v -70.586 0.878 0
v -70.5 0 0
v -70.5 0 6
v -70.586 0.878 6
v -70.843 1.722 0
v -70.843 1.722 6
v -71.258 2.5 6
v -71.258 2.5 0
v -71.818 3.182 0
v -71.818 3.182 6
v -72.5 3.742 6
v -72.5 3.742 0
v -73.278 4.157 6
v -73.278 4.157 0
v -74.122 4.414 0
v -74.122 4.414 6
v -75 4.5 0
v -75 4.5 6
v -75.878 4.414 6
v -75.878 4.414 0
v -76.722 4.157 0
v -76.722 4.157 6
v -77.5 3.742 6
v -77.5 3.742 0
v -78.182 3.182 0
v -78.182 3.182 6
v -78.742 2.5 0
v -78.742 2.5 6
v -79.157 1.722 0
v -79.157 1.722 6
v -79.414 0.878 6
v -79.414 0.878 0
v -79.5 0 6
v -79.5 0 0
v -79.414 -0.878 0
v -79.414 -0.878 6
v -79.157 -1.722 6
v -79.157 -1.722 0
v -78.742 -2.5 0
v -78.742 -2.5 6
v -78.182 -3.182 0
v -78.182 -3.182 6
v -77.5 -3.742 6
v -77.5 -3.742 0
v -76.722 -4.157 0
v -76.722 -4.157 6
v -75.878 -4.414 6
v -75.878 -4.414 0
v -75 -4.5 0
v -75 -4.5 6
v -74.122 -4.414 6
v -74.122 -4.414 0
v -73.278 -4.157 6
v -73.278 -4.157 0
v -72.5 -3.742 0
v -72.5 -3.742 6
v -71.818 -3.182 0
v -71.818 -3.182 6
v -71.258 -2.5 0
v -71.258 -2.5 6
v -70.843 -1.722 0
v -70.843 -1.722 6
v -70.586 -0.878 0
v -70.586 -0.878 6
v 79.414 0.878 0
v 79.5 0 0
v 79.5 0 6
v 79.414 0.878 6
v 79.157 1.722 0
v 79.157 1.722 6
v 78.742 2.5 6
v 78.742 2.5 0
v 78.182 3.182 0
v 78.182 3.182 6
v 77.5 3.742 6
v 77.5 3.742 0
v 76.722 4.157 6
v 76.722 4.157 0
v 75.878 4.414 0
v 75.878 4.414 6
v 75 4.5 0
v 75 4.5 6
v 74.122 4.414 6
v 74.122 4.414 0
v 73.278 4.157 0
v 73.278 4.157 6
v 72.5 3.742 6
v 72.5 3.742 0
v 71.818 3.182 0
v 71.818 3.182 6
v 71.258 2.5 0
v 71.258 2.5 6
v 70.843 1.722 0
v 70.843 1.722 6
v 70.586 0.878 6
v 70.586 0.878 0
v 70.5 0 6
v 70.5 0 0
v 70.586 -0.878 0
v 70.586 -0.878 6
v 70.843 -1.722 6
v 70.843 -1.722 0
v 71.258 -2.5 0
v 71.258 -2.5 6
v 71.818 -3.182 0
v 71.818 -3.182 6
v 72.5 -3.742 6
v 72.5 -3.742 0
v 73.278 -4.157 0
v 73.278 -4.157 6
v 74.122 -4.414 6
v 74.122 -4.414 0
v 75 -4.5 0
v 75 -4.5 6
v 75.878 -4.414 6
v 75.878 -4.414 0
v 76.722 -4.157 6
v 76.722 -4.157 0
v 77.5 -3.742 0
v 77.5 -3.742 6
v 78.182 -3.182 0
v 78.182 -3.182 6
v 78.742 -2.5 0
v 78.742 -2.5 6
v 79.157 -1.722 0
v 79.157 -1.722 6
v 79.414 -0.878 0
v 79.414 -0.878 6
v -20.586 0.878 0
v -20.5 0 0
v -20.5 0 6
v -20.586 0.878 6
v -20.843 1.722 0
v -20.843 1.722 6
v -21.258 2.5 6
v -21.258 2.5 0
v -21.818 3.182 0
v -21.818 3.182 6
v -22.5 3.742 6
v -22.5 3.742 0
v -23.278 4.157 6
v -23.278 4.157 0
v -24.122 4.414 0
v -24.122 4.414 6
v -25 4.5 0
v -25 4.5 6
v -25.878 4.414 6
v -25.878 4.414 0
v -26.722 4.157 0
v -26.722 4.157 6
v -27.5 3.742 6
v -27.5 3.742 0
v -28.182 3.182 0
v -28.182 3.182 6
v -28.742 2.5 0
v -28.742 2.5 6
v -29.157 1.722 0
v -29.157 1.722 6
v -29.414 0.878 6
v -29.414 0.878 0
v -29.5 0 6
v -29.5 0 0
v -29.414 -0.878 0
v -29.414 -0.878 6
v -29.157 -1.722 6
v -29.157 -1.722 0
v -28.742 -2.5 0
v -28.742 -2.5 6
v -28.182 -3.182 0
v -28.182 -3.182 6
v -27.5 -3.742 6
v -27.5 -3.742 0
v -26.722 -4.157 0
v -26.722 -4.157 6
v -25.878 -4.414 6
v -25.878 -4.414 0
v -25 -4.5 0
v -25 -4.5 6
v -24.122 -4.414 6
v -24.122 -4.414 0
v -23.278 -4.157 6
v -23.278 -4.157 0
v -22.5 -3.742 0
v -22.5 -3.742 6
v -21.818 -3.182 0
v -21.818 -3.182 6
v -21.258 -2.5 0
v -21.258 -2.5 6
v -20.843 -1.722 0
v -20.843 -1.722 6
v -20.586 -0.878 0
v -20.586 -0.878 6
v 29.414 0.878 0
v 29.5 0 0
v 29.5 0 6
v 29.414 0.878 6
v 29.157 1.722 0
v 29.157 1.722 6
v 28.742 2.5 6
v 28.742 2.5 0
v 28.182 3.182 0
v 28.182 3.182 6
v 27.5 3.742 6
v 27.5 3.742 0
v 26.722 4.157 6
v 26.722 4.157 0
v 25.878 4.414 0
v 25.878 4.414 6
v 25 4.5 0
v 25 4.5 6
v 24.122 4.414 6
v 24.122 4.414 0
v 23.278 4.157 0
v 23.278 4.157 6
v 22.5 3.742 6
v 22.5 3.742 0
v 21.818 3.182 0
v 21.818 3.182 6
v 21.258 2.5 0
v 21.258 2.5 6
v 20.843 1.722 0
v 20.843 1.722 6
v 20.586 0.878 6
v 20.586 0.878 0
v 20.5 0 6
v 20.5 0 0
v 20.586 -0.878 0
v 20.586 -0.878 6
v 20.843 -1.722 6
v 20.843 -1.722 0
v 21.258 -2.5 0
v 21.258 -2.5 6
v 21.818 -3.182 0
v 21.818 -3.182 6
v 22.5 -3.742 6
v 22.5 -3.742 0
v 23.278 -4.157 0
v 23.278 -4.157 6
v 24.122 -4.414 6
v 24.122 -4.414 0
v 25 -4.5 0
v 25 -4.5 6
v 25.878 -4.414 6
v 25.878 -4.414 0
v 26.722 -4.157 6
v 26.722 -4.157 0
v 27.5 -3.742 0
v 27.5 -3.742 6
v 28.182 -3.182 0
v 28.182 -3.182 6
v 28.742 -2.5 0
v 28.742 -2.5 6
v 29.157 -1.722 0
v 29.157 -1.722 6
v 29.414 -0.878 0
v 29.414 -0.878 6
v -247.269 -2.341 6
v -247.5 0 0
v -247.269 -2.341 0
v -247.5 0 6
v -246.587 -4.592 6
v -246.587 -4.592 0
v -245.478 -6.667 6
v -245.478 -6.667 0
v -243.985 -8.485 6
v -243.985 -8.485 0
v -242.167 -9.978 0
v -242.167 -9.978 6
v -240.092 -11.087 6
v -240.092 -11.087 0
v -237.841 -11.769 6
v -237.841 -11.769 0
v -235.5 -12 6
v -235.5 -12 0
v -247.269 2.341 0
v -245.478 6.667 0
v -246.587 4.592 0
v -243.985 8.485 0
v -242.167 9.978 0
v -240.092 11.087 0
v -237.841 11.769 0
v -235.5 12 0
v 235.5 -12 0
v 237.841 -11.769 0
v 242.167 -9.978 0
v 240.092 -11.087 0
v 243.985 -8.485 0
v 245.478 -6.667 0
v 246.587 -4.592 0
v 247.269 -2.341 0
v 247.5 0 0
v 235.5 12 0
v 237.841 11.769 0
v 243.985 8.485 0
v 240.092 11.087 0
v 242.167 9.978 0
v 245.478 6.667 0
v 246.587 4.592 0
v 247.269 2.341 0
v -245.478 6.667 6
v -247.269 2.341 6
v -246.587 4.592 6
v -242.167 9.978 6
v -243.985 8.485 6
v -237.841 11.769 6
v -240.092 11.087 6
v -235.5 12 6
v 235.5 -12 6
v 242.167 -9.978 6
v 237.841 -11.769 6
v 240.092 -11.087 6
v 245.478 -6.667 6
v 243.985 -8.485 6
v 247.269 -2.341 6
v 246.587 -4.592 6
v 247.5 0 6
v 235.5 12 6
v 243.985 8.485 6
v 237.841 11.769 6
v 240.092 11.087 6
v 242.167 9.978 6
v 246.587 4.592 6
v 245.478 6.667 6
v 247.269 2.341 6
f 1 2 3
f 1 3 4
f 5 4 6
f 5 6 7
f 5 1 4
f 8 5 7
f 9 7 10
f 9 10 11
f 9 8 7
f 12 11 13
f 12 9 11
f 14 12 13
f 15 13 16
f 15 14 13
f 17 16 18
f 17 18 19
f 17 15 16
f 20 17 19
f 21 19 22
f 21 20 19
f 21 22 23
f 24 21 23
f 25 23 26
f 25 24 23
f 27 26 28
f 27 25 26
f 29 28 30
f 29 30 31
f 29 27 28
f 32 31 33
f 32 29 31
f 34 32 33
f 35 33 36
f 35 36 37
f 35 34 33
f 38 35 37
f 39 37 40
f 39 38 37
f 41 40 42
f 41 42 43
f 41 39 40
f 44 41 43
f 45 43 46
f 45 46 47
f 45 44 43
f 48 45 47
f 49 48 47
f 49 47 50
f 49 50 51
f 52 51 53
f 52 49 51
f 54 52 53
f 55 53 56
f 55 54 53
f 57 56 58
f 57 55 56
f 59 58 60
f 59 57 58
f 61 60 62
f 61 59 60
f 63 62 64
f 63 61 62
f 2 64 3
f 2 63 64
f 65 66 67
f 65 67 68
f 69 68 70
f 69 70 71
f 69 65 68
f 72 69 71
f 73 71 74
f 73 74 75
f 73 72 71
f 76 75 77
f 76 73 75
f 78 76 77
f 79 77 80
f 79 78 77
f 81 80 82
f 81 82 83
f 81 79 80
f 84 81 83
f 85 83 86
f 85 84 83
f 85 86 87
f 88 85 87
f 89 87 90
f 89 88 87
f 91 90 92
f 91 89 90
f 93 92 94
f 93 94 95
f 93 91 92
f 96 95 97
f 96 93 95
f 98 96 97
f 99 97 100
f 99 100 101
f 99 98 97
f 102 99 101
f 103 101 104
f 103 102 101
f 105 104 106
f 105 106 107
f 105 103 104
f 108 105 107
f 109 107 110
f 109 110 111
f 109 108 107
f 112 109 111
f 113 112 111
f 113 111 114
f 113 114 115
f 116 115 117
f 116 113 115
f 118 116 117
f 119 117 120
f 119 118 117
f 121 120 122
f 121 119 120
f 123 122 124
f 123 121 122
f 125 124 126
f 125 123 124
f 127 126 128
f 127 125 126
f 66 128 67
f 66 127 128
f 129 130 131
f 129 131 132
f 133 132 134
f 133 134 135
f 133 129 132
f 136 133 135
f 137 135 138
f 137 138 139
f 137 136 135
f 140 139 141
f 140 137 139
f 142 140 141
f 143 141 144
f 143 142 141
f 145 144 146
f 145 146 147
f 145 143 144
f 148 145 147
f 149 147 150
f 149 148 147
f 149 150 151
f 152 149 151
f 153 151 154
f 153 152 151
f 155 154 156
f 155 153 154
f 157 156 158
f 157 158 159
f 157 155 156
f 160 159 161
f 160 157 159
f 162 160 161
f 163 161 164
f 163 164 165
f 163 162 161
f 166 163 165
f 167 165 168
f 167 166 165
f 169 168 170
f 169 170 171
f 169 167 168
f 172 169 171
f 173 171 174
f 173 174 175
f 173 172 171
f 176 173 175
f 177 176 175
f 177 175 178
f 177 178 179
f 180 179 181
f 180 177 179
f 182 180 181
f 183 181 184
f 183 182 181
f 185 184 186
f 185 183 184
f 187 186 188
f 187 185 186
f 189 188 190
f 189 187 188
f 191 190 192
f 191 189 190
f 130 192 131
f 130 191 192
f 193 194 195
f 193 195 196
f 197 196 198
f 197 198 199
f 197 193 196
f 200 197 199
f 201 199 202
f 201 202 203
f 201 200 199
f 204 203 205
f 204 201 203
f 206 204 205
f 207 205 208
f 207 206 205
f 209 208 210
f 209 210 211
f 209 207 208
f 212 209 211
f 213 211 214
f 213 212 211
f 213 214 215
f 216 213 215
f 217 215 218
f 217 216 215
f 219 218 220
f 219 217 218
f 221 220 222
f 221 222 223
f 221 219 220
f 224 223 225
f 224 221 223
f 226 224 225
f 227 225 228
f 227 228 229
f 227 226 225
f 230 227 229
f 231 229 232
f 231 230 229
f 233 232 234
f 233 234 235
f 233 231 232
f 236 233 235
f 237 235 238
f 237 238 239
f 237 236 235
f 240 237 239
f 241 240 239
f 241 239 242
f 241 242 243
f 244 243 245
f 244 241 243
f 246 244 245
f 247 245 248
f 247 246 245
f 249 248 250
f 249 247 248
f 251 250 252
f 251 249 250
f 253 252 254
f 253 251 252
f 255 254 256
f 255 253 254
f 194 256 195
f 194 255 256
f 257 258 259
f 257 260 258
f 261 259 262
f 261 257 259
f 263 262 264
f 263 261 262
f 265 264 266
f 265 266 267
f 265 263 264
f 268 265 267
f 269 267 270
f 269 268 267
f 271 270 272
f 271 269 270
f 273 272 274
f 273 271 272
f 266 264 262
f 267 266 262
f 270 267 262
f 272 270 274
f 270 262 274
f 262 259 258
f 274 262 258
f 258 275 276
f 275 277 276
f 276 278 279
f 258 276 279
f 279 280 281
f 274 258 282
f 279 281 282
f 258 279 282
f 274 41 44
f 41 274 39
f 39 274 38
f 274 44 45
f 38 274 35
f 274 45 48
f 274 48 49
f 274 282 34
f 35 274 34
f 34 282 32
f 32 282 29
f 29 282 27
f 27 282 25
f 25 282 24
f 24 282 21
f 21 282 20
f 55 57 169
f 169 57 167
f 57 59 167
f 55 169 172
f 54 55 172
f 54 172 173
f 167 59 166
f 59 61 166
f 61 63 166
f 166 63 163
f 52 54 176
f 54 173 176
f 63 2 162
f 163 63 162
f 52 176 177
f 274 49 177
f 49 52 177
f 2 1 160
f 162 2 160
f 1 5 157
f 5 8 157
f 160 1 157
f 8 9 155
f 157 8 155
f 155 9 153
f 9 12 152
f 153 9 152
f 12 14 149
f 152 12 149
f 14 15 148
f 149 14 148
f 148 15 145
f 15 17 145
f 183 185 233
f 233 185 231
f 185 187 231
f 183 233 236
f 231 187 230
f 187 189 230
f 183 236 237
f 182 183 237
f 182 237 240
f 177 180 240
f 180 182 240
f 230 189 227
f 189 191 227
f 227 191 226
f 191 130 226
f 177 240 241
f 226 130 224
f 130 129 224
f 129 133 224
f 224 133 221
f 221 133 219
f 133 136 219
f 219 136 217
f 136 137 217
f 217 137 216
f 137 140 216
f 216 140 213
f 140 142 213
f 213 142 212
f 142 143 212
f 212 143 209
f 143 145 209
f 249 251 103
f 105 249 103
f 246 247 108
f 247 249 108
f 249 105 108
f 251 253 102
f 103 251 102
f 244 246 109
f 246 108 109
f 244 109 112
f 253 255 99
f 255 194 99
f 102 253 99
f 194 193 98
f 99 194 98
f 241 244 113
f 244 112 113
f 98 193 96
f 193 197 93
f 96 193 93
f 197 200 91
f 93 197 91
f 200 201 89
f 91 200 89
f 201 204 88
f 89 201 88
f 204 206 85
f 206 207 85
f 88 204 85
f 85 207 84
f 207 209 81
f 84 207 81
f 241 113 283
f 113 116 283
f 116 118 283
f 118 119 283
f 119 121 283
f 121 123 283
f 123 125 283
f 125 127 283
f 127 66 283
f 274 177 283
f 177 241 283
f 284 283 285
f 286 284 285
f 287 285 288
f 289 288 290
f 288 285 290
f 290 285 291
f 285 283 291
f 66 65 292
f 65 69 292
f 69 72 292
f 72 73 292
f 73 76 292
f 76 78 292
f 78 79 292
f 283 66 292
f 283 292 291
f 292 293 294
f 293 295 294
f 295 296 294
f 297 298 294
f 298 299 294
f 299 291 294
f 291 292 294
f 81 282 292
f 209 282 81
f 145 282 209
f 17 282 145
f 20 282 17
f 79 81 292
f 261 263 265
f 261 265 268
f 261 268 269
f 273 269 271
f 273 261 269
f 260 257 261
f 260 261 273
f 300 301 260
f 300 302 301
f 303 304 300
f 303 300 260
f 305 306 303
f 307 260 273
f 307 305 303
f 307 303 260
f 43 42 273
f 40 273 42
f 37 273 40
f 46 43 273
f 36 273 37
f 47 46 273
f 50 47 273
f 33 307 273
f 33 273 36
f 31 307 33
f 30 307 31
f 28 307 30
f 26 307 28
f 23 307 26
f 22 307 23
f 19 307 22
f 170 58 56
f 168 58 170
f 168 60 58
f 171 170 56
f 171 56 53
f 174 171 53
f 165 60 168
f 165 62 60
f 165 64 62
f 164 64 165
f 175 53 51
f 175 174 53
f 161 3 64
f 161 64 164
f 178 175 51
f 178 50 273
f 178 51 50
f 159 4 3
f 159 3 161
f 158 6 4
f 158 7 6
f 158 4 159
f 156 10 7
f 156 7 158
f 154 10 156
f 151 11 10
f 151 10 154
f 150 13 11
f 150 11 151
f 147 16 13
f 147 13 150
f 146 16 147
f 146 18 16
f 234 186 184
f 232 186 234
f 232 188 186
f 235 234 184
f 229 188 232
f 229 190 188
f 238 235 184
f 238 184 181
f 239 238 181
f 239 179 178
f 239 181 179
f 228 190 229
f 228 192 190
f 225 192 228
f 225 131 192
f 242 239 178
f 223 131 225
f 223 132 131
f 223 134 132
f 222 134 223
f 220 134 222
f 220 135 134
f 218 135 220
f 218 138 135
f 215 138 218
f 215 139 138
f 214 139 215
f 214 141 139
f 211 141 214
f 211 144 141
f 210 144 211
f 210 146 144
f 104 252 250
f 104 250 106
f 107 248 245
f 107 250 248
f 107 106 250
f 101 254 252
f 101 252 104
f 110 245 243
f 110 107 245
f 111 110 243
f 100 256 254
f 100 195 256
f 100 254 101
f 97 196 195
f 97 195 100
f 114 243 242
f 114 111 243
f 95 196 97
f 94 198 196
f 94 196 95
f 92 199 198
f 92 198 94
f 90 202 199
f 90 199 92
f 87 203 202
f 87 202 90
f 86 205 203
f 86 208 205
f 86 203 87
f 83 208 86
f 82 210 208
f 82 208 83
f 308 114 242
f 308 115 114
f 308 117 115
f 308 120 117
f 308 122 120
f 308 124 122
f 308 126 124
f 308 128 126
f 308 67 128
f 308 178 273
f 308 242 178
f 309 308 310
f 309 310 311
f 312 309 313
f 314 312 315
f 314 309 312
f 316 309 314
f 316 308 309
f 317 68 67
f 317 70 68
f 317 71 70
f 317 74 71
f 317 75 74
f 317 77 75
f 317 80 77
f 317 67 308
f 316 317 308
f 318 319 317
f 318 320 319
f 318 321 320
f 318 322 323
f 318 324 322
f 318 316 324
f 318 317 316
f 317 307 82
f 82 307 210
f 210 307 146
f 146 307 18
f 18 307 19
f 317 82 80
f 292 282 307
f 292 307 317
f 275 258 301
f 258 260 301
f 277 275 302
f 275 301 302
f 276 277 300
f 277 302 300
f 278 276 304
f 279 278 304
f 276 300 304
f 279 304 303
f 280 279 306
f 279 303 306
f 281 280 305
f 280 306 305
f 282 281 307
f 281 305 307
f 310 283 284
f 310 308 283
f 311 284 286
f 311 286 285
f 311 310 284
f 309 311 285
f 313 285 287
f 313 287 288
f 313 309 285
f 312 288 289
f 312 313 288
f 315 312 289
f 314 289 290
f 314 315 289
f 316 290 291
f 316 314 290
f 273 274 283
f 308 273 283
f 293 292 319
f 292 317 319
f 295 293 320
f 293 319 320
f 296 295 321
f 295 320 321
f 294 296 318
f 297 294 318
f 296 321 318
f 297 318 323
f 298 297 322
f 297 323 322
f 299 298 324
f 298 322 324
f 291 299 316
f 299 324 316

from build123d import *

# Parameters (mm, degrees)
SKETCH1_W           = 495
SKETCH1_H           = 24
SKETCH1_R           = 4.5
BOSS_EXTRUDE1_DEPTH = 6
FILLET2_R           = 12


with BuildPart() as part:
    # Sketch1 → Boss-Extrude1 (new body)
    with BuildSketch(Plane.XY):
        Rectangle(SKETCH1_W, SKETCH1_H)
        with Locations((75, 0)):
            Circle(SKETCH1_R, mode=Mode.SUBTRACT)
        with Locations((25, 0)):
            Circle(SKETCH1_R, mode=Mode.SUBTRACT)
        with Locations((-25, 0)):
            Circle(SKETCH1_R, mode=Mode.SUBTRACT)
        with Locations((-75, 0)):
            Circle(SKETCH1_R, mode=Mode.SUBTRACT)
    extrude(amount=BOSS_EXTRUDE1_DEPTH)

    # Fillet2
    fillet2_edges = [part.edges().sort_by_distance(p)[0] for p in [
        (-247.5, -12, 3),
        (-247.5, 12, 3),
        (247.5, 12, 3),
        (247.5, -12, 3),
    ]]
    fillet(fillet2_edges, radius=FILLET2_R - 0.0001)  # a hair under: the kernel refuses the full size


solid = part.part
